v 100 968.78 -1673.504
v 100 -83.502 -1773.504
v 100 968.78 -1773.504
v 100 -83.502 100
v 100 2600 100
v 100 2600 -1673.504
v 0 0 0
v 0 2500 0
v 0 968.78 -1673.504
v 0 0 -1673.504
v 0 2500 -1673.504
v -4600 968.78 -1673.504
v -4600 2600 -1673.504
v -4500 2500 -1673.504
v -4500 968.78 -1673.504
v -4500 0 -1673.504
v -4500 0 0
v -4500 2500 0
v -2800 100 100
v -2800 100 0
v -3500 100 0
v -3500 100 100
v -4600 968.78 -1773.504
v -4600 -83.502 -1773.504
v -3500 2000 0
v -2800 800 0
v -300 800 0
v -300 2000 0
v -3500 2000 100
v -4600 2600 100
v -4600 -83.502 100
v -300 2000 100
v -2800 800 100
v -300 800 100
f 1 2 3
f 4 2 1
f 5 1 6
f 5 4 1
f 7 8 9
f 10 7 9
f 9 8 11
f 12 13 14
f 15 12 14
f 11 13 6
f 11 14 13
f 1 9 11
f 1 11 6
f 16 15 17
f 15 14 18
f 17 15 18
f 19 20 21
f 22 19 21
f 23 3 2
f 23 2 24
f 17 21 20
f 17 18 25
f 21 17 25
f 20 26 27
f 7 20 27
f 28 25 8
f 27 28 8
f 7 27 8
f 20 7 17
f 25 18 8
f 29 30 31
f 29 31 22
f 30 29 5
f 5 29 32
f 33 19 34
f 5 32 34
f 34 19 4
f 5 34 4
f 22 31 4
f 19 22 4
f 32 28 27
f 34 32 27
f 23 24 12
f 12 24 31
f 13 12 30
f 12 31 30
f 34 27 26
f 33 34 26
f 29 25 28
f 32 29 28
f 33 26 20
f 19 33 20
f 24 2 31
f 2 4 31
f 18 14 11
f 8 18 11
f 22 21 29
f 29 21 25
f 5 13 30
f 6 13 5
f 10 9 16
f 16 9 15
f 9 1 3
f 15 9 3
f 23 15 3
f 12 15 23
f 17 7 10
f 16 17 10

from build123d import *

# Parameters (mm, degrees)
SKETCH_16_W      = 4500
SKETCH_16_H      = 2500
EXTRUDE_5_DEPTH  = 100
SKETCH_19_W      = 1773.504419248
SKETCH_19_H      = 83.501937027
EXTRUDE_6_DEPTH  = 4500
SKETCH_20_W      = 1773.504419248
SKETCH_20_H      = 2583.501937027
EXTRUDE_7_DEPTH  = 100
SKETCH_21_W      = 1773.504419248
SKETCH_21_H      = 2583.501937027
EXTRUDE_8_DEPTH  = 100
SKETCH_22_W      = 4700
SKETCH_22_H      = 1773.504419248
EXTRUDE_9_DEPTH  = 100
SKETCH_23_W      = 4700
SKETCH_23_H      = 1052.282115433
EXTRUDE_10_DEPTH = 100


with BuildPart() as part:
    # Эскиз16 → Бобышка-Вытянуть5 (new body)
    with BuildSketch(Plane.XY):
        with Locations((-2250, 1250)):
            Rectangle(SKETCH_16_W, SKETCH_16_H)
        Polygon((-2800, 100), (-3500, 100), (-3500, 2000), (-2800, 2000), (-300, 2000), (-300, 800), (-2800, 800), align=None, mode=Mode.SUBTRACT)
    extrude(amount=EXTRUDE_5_DEPTH)

    # Эскиз19 → Бобышка-Вытянуть6 (add)
    with BuildSketch(Plane(origin=(0, 0, 0), x_dir=(0, 0, -1), z_dir=(1, 0, 0))):
        with Locations((786.752209624, -41.750968514)):
            Rectangle(SKETCH_19_W, SKETCH_19_H)
    extrude(amount=-EXTRUDE_6_DEPTH)

    # Эскиз20 → Бобышка-Вытянуть7 (add)
    with BuildSketch(Plane(origin=(0, 0, 0), x_dir=(0, 0, -1), z_dir=(1, 0, 0))):
        with Locations((786.752209624, 1208.249031486)):
            Rectangle(SKETCH_20_W, SKETCH_20_H)
    extrude(amount=EXTRUDE_7_DEPTH)

    # Эскиз21 → Бобышка-Вытянуть8 (add)
    with BuildSketch(Plane.ZY.offset(4500)):
        with Locations((-786.752209624, 1208.249031486)):
            Rectangle(SKETCH_21_W, SKETCH_21_H)
    extrude(amount=EXTRUDE_8_DEPTH)

    # Эскиз22 → Бобышка-Вытянуть9 (add)
    with BuildSketch(Plane(origin=(0, 2500, 0), x_dir=(1, 0, 0), z_dir=(0, 1, 0))):
        with Locations((-2250, 786.752209624)):
            Rectangle(SKETCH_22_W, SKETCH_22_H)
    extrude(amount=EXTRUDE_9_DEPTH)

    # Эскиз23 → Бобышка-Вытянуть10 (add)
    with BuildSketch(Plane(origin=(0, 0, -1673.504419248), x_dir=(-1, 0, 0), z_dir=(0, 0, -1))):
        with Locations((2250, 442.639120689)):
            Rectangle(SKETCH_23_W, SKETCH_23_H)
    extrude(amount=EXTRUDE_10_DEPTH)


solid = part.part
